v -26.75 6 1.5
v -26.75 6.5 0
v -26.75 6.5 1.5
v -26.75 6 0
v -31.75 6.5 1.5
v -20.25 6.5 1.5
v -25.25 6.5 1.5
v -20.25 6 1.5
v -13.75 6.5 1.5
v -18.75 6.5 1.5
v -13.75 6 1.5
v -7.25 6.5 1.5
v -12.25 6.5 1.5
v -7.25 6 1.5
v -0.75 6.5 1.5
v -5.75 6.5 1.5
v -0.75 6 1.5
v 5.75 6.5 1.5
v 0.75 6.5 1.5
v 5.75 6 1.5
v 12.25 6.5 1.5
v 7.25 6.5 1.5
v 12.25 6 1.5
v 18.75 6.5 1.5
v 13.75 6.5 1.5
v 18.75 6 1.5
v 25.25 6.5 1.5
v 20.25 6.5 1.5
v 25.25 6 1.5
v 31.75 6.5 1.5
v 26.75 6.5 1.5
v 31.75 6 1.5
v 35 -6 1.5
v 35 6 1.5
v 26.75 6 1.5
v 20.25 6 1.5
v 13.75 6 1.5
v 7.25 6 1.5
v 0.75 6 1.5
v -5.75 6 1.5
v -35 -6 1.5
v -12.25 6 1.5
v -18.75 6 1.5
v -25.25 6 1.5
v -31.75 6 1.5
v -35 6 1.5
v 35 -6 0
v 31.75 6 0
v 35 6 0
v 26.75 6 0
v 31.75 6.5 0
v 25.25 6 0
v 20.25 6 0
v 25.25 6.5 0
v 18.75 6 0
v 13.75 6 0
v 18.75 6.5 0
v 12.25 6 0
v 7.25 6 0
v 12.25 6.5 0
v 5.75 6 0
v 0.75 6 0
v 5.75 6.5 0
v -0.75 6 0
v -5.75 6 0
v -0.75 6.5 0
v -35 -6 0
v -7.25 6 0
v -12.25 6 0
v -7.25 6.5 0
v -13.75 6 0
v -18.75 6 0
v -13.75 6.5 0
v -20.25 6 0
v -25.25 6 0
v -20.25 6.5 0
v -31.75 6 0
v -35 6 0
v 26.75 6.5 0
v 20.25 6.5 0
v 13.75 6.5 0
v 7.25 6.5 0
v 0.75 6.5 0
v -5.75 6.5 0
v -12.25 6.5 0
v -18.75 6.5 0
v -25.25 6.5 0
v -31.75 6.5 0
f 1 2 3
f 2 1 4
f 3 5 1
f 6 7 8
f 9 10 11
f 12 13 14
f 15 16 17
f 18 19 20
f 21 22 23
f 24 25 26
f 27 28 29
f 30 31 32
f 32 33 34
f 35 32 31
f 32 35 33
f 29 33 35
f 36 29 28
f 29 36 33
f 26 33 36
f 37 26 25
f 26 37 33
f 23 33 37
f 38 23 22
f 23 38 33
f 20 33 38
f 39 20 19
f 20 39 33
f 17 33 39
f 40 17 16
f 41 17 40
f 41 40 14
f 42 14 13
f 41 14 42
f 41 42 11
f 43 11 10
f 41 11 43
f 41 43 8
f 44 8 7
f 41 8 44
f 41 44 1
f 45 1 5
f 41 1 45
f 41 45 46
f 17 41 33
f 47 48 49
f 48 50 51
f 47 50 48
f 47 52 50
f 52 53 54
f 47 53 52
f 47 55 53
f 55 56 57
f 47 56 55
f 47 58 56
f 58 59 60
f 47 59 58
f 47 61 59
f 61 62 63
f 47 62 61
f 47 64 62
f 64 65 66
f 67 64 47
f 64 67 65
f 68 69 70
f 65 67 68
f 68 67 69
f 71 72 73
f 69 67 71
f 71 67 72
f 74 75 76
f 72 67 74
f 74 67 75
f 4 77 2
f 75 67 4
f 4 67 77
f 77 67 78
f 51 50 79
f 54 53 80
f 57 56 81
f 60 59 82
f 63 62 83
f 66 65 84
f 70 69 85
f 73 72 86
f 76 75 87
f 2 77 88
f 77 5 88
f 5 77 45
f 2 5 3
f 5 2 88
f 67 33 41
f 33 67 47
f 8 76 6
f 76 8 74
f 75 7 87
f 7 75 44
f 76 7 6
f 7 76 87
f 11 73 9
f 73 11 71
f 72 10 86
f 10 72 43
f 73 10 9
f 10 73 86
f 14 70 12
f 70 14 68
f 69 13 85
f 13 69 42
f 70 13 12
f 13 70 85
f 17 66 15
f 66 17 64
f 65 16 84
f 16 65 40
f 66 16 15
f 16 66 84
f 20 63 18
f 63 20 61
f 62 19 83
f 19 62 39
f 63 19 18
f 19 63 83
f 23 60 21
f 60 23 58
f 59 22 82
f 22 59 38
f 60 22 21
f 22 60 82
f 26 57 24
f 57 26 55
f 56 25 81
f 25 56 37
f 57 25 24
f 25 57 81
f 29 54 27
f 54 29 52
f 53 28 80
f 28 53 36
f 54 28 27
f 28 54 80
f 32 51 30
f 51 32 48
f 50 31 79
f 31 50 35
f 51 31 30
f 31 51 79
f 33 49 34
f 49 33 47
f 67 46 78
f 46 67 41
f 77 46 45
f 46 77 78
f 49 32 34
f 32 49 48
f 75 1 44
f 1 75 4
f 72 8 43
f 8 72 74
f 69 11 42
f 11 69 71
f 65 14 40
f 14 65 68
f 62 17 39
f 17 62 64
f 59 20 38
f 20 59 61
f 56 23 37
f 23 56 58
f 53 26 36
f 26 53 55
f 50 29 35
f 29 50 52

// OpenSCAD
// 10-well agarose gel comb - printed lying flat
// Units: mm

// ---- Parameters ----
plate_t      = 1.5;   // plate thickness (Z)
spine_len    = 70;    // spine length (X)
spine_w      = 12;    // spine width (Y)
tooth_w      = 5.0;   // tooth width (X)
tooth_len    = 12;    // tooth length (Y)
tooth_count  = 10;    // number of teeth
gap          = 1.5;   // gap between teeth (X)
overhang     = 0.5;   // tooth extension past spine front edge

$fn = 64;

// ---- Derived ----
pitch   = tooth_w + gap;
x_start = -(tooth_count - 1) * pitch / 2;  // centre row on spine

// ---- Model ----
union() {
    // Spine
    translate([-spine_len/2, -spine_w/2, 0])
        cube([spine_len, spine_w, plate_t]);

    // Teeth
    for (i = [0 : tooth_count - 1])
        translate([x_start + i * pitch - tooth_w/2,
                   spine_w/2 - tooth_len,
                   0])
            cube([tooth_w, tooth_len + overhang, plate_t]);
}
